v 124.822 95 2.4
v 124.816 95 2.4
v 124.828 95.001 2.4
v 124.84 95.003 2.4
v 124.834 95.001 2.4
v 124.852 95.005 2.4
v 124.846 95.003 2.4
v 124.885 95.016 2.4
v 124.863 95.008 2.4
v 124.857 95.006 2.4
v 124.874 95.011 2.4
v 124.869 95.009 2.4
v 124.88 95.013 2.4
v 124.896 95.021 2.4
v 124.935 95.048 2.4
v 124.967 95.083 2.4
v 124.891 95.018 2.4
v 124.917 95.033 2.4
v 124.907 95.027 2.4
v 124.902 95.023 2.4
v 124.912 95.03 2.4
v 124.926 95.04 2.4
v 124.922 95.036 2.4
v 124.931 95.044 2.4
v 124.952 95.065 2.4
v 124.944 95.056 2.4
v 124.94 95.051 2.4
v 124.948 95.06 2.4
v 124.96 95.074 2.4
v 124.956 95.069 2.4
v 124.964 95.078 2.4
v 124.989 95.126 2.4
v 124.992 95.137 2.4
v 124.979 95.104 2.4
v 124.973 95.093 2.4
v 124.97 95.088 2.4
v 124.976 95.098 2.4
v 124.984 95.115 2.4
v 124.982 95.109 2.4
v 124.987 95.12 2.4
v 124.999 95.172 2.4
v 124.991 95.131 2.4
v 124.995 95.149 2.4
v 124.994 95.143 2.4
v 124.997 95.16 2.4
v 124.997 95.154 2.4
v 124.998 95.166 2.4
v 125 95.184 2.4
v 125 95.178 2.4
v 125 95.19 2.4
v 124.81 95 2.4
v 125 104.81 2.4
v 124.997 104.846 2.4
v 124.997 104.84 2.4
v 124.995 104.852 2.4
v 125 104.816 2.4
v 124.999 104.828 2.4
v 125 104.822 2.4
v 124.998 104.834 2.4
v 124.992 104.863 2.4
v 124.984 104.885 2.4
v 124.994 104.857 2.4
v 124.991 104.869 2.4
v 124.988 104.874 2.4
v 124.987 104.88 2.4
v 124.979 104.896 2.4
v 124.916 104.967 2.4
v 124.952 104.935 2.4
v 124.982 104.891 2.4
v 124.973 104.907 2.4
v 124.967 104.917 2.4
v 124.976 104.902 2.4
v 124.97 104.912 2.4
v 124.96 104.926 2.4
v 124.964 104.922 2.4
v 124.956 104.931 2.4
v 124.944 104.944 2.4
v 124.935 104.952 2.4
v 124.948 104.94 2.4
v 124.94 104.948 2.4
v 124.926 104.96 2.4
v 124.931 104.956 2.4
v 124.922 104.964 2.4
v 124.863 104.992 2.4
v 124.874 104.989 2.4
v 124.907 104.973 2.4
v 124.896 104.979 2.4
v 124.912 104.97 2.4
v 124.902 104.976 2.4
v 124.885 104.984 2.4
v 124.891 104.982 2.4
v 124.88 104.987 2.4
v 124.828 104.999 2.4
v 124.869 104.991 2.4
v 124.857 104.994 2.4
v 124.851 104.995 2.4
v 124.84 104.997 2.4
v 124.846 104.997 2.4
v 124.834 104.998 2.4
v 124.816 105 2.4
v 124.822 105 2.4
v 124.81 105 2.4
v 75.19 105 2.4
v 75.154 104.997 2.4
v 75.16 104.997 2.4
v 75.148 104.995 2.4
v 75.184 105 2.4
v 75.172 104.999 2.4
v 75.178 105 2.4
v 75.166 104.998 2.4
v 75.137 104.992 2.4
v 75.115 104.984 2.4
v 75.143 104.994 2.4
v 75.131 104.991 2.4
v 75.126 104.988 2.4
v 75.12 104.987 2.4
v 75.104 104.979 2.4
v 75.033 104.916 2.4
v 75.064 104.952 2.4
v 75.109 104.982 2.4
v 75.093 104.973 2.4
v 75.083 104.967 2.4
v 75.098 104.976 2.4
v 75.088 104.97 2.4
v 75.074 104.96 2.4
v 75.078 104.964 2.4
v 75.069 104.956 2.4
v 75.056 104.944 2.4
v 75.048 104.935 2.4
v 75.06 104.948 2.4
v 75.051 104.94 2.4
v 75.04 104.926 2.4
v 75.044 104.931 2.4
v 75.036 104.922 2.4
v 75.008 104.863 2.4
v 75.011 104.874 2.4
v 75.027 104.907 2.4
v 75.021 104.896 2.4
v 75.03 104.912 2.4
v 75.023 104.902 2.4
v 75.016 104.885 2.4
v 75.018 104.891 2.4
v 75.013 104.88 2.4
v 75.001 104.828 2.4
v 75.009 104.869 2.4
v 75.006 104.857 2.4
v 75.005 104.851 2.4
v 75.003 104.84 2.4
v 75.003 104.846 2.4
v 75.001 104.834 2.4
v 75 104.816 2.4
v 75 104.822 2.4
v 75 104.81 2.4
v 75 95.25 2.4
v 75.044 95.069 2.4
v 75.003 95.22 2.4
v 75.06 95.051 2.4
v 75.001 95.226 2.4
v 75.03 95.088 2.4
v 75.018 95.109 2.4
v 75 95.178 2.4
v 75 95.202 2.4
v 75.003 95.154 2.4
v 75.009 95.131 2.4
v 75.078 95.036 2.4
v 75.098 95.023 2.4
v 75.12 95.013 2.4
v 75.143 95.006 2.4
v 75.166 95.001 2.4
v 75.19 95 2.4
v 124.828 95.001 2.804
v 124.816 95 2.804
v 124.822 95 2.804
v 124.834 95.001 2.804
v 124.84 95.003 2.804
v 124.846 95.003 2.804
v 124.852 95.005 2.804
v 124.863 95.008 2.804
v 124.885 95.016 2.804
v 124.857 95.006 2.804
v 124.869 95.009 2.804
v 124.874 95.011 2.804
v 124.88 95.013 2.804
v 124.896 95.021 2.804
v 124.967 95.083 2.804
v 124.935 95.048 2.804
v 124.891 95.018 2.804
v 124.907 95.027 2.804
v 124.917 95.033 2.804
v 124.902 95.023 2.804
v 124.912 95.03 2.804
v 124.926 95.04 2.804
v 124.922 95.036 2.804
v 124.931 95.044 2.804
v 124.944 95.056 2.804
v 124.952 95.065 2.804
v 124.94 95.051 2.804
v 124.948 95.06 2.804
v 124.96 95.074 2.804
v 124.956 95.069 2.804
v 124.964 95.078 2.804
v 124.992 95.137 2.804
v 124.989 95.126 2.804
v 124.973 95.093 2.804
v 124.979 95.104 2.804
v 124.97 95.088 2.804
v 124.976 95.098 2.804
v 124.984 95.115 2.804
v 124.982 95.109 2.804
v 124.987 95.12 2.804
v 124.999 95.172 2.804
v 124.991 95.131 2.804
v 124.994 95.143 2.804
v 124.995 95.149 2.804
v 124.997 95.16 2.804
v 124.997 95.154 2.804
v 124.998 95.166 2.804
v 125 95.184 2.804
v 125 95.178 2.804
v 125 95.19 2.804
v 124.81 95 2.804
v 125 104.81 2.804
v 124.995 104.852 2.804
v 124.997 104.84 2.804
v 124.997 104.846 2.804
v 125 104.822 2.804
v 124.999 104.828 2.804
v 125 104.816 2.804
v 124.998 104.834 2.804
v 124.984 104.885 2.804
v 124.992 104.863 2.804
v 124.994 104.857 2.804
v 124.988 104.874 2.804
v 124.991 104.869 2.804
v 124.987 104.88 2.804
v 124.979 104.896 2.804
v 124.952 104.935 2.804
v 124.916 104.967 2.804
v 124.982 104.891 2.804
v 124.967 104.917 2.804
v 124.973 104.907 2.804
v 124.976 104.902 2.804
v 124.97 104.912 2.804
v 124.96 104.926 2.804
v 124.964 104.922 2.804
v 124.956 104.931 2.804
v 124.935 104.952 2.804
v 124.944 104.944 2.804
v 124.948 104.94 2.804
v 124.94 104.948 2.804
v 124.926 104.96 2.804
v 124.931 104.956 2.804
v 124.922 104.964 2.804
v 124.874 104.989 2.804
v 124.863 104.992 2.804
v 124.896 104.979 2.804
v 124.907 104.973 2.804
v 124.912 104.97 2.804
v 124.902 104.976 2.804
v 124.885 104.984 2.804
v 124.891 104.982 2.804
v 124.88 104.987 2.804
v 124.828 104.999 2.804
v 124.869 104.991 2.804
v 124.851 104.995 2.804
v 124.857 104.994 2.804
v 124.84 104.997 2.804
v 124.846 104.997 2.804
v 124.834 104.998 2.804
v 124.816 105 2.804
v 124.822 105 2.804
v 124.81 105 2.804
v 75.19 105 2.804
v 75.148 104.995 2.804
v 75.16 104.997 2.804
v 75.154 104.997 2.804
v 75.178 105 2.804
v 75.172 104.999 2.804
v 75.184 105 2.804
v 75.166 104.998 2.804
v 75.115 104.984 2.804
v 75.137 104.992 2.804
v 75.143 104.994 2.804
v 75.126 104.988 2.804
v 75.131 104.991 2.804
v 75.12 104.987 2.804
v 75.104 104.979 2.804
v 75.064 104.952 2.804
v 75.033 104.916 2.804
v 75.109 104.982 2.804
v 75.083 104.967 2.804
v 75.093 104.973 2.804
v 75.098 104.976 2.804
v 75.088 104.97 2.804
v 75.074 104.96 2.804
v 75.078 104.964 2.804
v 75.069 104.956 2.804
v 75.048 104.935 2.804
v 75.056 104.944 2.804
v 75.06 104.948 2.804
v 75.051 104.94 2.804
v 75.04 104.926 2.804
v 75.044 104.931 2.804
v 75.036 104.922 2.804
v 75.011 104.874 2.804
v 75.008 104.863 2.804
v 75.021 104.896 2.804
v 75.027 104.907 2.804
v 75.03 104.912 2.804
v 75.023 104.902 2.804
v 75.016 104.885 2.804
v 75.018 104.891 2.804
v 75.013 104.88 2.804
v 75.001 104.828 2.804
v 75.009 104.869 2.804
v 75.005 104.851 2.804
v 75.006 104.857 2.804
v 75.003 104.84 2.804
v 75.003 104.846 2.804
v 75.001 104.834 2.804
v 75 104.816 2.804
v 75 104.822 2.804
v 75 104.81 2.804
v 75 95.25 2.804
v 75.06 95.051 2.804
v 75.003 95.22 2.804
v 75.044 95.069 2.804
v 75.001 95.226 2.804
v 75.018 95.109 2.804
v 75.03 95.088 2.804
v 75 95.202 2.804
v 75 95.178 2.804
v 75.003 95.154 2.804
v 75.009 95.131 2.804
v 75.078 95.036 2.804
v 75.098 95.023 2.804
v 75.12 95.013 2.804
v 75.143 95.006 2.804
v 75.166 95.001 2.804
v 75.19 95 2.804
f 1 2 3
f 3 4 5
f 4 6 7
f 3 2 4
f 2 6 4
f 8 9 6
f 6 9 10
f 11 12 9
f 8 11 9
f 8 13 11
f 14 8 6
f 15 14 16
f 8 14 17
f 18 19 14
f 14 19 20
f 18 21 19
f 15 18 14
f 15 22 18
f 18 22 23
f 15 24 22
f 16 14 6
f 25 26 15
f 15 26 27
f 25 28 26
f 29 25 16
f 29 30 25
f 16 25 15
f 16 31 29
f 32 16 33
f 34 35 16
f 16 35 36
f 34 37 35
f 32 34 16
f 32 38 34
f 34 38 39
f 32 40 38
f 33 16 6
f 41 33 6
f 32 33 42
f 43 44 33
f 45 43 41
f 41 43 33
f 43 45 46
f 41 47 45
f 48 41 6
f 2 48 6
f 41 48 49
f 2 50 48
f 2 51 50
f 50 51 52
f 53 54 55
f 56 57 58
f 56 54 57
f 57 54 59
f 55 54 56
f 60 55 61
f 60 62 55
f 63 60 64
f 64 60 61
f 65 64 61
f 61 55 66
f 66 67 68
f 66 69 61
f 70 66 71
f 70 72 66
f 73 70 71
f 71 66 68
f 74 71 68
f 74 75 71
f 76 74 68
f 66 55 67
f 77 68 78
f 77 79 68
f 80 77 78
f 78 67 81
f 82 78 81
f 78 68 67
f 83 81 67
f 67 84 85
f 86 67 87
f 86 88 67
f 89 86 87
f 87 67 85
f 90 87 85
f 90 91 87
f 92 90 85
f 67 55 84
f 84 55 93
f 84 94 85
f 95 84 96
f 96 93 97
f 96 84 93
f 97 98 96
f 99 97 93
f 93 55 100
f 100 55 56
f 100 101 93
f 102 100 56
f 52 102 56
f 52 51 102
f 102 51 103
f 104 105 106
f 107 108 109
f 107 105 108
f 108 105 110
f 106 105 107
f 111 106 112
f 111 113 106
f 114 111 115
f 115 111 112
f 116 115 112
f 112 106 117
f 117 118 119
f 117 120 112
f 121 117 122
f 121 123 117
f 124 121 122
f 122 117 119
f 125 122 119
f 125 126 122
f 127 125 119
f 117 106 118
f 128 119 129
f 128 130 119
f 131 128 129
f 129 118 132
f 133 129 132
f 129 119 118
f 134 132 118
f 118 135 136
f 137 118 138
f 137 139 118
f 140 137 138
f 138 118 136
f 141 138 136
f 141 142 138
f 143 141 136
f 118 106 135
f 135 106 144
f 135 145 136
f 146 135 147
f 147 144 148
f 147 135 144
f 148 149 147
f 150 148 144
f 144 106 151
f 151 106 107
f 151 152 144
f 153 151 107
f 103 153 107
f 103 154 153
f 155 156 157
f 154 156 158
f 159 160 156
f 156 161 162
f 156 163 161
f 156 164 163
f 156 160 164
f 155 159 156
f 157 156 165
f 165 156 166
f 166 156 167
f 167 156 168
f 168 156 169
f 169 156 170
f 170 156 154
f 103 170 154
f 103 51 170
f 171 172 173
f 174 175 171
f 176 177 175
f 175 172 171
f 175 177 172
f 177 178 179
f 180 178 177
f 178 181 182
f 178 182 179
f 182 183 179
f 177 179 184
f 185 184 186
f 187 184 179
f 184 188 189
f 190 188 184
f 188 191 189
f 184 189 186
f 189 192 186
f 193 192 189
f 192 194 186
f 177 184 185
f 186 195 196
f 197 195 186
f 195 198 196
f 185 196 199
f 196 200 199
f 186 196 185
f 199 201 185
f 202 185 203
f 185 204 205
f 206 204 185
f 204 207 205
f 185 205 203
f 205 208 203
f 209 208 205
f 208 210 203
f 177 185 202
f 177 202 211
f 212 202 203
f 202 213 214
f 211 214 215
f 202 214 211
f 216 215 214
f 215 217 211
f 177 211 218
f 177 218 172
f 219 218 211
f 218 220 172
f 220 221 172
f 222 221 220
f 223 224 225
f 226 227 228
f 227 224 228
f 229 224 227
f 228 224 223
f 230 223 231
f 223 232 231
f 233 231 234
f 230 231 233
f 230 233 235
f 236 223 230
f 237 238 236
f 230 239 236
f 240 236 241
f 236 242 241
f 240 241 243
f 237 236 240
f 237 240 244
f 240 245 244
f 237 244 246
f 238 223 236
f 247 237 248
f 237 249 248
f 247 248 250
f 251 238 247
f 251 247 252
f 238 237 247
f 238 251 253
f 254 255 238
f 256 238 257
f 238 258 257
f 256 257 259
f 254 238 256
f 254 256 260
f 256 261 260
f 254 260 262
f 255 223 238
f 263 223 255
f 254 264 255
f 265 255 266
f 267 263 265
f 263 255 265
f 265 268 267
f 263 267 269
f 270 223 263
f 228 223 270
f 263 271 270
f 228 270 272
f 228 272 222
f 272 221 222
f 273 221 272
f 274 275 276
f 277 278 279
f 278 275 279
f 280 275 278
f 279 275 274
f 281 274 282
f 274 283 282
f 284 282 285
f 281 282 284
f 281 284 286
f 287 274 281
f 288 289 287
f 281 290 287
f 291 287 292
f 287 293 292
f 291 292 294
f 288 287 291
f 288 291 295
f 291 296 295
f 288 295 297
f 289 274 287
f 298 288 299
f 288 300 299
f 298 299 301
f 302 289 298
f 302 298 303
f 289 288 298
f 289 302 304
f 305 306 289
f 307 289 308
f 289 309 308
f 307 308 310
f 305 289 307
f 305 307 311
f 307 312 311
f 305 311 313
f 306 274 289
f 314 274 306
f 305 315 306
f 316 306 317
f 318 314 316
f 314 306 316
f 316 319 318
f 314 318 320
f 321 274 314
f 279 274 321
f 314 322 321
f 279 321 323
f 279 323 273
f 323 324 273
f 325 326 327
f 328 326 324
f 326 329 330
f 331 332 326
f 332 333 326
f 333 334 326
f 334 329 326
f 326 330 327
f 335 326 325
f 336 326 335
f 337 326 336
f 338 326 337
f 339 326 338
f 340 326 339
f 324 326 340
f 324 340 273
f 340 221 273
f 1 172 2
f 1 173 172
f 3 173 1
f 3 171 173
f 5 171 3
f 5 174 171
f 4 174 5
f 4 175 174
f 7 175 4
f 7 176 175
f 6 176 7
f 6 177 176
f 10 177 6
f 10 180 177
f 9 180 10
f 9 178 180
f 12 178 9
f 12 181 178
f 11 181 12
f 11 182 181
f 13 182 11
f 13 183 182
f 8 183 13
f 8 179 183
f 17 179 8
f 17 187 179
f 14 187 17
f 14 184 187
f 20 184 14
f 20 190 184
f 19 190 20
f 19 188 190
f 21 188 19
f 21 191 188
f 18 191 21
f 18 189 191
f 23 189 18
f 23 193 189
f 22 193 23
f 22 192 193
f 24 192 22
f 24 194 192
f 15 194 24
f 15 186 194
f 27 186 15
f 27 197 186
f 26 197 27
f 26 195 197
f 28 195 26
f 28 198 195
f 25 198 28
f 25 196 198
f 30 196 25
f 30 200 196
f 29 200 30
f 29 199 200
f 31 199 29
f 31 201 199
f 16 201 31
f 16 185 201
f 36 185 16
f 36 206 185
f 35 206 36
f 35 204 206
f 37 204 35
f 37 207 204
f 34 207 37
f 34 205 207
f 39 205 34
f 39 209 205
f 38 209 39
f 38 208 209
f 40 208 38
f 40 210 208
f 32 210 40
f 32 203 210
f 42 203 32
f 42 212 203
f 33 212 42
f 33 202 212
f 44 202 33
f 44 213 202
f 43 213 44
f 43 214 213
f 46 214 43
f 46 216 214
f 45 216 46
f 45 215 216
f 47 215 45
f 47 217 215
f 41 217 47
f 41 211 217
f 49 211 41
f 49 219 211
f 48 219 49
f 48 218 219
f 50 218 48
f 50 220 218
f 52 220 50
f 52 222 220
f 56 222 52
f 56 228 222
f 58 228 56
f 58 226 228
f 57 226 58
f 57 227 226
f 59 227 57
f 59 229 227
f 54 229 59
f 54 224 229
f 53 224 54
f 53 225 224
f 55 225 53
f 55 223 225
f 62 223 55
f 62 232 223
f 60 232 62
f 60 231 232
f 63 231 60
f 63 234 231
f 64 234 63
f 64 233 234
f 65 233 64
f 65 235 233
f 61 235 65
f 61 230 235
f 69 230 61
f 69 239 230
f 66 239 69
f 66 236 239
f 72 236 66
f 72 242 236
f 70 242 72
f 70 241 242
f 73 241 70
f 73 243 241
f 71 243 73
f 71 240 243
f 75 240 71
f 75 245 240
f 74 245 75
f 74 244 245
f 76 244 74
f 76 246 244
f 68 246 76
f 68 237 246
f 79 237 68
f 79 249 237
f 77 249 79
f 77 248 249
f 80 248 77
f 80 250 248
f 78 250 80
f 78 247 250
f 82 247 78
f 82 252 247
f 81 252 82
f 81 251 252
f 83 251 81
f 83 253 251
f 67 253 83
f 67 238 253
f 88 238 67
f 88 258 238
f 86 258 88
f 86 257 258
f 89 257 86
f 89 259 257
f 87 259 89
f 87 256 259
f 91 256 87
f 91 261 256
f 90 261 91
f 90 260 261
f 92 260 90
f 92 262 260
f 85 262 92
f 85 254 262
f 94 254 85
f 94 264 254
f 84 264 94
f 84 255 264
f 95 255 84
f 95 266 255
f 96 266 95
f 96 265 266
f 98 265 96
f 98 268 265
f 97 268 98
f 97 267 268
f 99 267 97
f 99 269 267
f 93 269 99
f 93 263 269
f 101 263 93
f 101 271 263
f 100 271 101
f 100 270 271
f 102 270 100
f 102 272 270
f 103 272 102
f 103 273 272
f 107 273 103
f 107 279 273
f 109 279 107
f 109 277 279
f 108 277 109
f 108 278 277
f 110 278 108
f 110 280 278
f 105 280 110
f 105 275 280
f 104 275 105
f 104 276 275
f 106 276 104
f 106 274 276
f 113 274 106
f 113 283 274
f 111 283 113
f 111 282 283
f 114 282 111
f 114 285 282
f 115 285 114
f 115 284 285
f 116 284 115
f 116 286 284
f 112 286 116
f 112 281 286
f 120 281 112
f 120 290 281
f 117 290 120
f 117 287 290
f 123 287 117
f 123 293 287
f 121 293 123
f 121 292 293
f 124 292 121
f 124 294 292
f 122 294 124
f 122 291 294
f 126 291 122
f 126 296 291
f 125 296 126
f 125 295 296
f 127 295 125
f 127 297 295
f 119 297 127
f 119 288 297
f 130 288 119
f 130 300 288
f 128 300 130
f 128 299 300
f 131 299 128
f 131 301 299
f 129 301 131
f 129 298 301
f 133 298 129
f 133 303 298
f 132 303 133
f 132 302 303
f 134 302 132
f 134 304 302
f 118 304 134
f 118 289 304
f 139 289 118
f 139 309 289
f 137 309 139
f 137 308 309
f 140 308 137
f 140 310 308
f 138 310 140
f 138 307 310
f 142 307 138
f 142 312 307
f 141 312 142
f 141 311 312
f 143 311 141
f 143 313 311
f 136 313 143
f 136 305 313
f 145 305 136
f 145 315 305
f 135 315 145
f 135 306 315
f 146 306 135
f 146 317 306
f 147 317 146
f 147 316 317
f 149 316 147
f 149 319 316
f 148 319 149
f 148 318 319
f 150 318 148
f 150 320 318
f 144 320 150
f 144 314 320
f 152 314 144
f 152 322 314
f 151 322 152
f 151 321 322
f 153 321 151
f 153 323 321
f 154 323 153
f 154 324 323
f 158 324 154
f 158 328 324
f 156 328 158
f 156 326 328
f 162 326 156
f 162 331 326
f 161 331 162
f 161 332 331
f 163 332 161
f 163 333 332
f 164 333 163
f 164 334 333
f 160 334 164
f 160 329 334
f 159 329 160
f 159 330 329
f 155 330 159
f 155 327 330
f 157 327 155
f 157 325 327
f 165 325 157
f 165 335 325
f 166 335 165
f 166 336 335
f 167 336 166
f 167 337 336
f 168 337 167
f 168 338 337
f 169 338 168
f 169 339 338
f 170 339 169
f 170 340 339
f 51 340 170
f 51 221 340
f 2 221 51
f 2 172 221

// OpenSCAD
module drawBasicShape(x1, y1, x2, y2, width)
{
	length = sqrt((x1-x2)*(x1-x2) + (y1-y2)*(y1-y2));
	if (width!=0.0) {
		square(size = [width, length], center = false);
		translate([width/2.0, 0, 0]) circle(d=width);
		translate([width/2.0, length, 0]) circle(d=width);
	}
}

module translateAndRotate(x1, y1, x2, y2, width)
{
	if (width != 0.0) {
		angle = atan((y2-y1)/(x2-x1)) +270;
		if (x2>=x1) {
			translate([x1, y1, 0.0]) rotate([0.0, 0.0, angle]) translate([-width/2.0, 0.0, 0.0]) scale([1.0, 1.0, 1.0]) drawBasicShape(x1, y1, x2, y2, width);
		}
		else {
			translate([x1, y1, 0.0]) rotate([0.0, 0.0, angle+180]) translate([-width/2.0, 0.0, 0.0]) scale([1.0, 1.0, 1.0]) drawBasicShape(x1, y1, x2, y2, width);		}
	}
}

$fn=50;

points5 = [
[75.77800000, 95.77800000, 0.00000000],
[124.22200000, 95.77800000, 0.37999548],
[124.22200000, 104.22200000, 0.37997788],
[75.77800000, 104.22200000, 0.37999672],
[75.77800000, 95.83800000, 0.37997423],
[75.48400000, 95.48400000, 0.00000000],
[124.51600000, 95.48400000, 0.37999868],
[124.51600000, 104.51600000, 0.37998977],
[75.48400000, 104.51600000, 0.37999746],
[75.48400000, 95.54400000, 0.37999314],
[75.19000000, 95.19000000, 0.00000000],
[124.81000000, 95.19000000, 0.37999939],
[124.81000000, 104.81000000, 0.38000021],
[75.19000000, 104.81000000, 0.38000060],
[75.19000000, 95.25000000, 0.37999715],
[75.53600000, 95.39000000, 0.00000000],
[76.11100000, 95.94600000, 0.00000000],
[75.94600000, 96.11100000, 0.37961375],
[75.94600000, 96.52800000, 0.38001190],
[76.52800000, 95.94600000, 0.37989934],
[76.94500000, 95.94600000, 0.38015610],
[75.94600000, 96.94500000, 0.37994651],
[75.94600000, 97.36200000, 0.38001190],
[77.36200000, 95.94600000, 0.37999592],
[77.77900000, 95.94600000, 0.38001190],
[75.94600000, 97.77900000, 0.37999966],
[75.94600000, 98.19600000, 0.38015610],
[78.19600000, 95.94600000, 0.38000201],
[78.61300000, 95.94600000, 0.38001190],
[75.94600000, 98.61300000, 0.38001957],
[75.94600000, 99.03000000, 0.38001190],
[79.03000000, 95.94600000, 0.38001859],
[79.44700000, 95.94600000, 0.38015610],
[75.94600000, 99.44700000, 0.38001785],
[75.94600000, 99.86400000, 0.38001190],
[79.86400000, 95.94600000, 0.38002811],
[80.28100000, 95.94600000, 0.38001190],
[75.94600000, 100.28100000, 0.38002660],
[75.94600000, 100.69800000, 0.38001190],
[80.69800000, 95.94600000, 0.38003429],
[81.11500000, 95.94600000, 0.38001190],
[75.94600000, 101.11500000, 0.38003252],
[75.94600000, 101.53300000, 0.37930814],
[81.53300000, 95.94600000, 0.37997836],
[81.95000000, 95.94600000, 0.38001190],
[75.94600000, 101.95000000, 0.37998072],
[75.94600000, 102.36700000, 0.38015610],
[82.36700000, 95.94600000, 0.37998277],
[82.78400000, 95.94600000, 0.38015610],
[75.94600000, 102.78400000, 0.37999079],
[75.94600000, 103.20100000, 0.38001190],
[83.20100000, 95.94600000, 0.37999203],
[83.61800000, 95.94600000, 0.38001190],
[75.94600000, 103.61800000, 0.37999868],
[75.95600000, 104.02400000, 0.38048727],
[84.03500000, 95.94600000, 0.38000275],
[84.45200000, 95.94600000, 0.38001190],
[76.34400000, 104.05400000, 0.38000229],
[76.76100000, 104.05400000, 0.38015610],
[84.86900000, 95.94600000, 0.38000229],
[85.28600000, 95.94600000, 0.38001190],
[77.17800000, 104.05400000, 0.38000754],
[77.59500000, 104.05400000, 0.38001190],
[85.70300000, 95.94600000, 0.38000229],
[86.12000000, 95.94600000, 0.38001190],
[78.01200000, 104.05400000, 0.38000754],
[78.42900000, 104.05400000, 0.38001190],
[86.53700000, 95.94600000, 0.38000229],
[86.95400000, 95.94600000, 0.38015610],
[78.84600000, 104.05400000, 0.38000229],
[79.26300000, 104.05400000, 0.38001190],
[87.37100000, 95.94600000, 0.38000229],
[87.78900000, 95.94600000, 0.37945200],
[79.68000000, 104.05400000, 0.37998415],
[80.09700000, 104.05400000, 0.38001190],
[88.20600000, 95.94600000, 0.37998940],
[88.62300000, 95.94600000, 0.38001190],
[80.51500000, 104.05400000, 0.38000229],
[80.93200000, 104.05400000, 0.38015610],
[89.04000000, 95.94600000, 0.38000229],
[89.45700000, 95.94600000, 0.38001190],
[81.34900000, 104.05400000, 0.38000229],
[81.76600000, 104.05400000, 0.38015610],
[89.87400000, 95.94600000, 0.38000229],
[90.29100000, 95.94600000, 0.38001190],
[82.18300000, 104.05400000, 0.38000754],
[82.60000000, 104.05400000, 0.38001190],
[90.70800000, 95.94600000, 0.38000229],
[91.12500000, 95.94600000, 0.38001190],
[83.01700000, 104.05400000, 0.38000754],
[83.43400000, 104.05400000, 0.38001190],
[91.54200000, 95.94600000, 0.38000229],
[91.95900000, 95.94600000, 0.38015610],
[83.85100000, 104.05400000, 0.38000229],
[84.26800000, 104.05400000, 0.38001190],
[92.37600000, 95.94600000, 0.38000754],
[92.79300000, 95.94600000, 0.38001190],
[84.68500000, 104.05400000, 0.38000229],
[85.10200000, 104.05400000, 0.38001190],
[93.21000000, 95.94600000, 0.38000754],
[93.62700000, 95.94600000, 0.38001190],
[85.51900000, 104.05400000, 0.38000229],
[85.93600000, 104.05400000, 0.38015610],
[94.04400000, 95.94600000, 0.38000229],
[94.46200000, 95.94600000, 0.37930814],
[86.35300000, 104.05400000, 0.37998940],
[86.77000000, 104.05400000, 0.38001190],
[94.87900000, 95.94600000, 0.37998415],
[95.29600000, 95.94600000, 0.38001190],
[87.18800000, 104.05400000, 0.38000754],
[87.60500000, 104.05400000, 0.38001190],
[95.71300000, 95.94600000, 0.38000229],
[96.13000000, 95.94600000, 0.38015610],
[88.02200000, 104.05400000, 0.38000229],
[88.43900000, 104.05400000, 0.38001190],
[96.54700000, 95.94600000, 0.38000754],
[96.96400000, 95.94600000, 0.38001190],
[88.85600000, 104.05400000, 0.38000229],
[89.27300000, 104.05400000, 0.38001190],
[97.38100000, 95.94600000, 0.38000754],
[97.79800000, 95.94600000, 0.38001190],
[89.69000000, 104.05400000, 0.38000229],
[90.10700000, 104.05400000, 0.38015610],
[98.21500000, 95.94600000, 0.38000229],
[98.63200000, 95.94600000, 0.38001190],
[90.52400000, 104.05400000, 0.38000754],
[90.94100000, 104.05400000, 0.38001190],
[99.04900000, 95.94600000, 0.38000229],
[99.46600000, 95.94600000, 0.38001190],
[91.35800000, 104.05400000, 0.38000754],
[91.77500000, 104.05400000, 0.38001190],
[99.88300000, 95.94600000, 0.38000229],
[100.30000000, 95.94600000, 0.38015610],
[92.19200000, 104.05400000, 0.38000229],
[92.60900000, 104.05400000, 0.38001190],
[100.71800000, 95.94600000, 0.37998940],
[101.13500000, 95.94600000, 0.38001190],
[93.02600000, 104.05400000, 0.37998415],
[93.44400000, 104.05400000, 0.37930814],
[101.55200000, 95.94600000, 0.38000754],
[101.96900000, 95.94600000, 0.38001190],
[93.86100000, 104.05400000, 0.38000229],
[94.27800000, 104.05400000, 0.38015610],
[102.38600000, 95.94600000, 0.38000229],
[102.80300000, 95.94600000, 0.38001190],
[94.69500000, 104.05400000, 0.38000754],
[95.11200000, 104.05400000, 0.38001190],
[103.22000000, 95.94600000, 0.38000229],
[103.63700000, 95.94600000, 0.38001190],
[95.52900000, 104.05400000, 0.38000754],
[95.94600000, 104.05400000, 0.38001190],
[104.05400000, 95.94600000, 0.38000229],
[104.47100000, 95.94600000, 0.38015610],
[96.36300000, 104.05400000, 0.38000229],
[96.78000000, 104.05400000, 0.38001190],
[104.88800000, 95.94600000, 0.38000754],
[105.30500000, 95.94600000, 0.38001190],
[97.19700000, 104.05400000, 0.38000229],
[97.61400000, 104.05400000, 0.38001190],
[105.72200000, 95.94600000, 0.38000754],
[106.13900000, 95.94600000, 0.38001190],
[98.03100000, 104.05400000, 0.38000229],
[98.44800000, 104.05400000, 0.38015610],
[106.55600000, 95.94600000, 0.38000229],
[106.97300000, 95.94600000, 0.38001190],
[98.86500000, 104.05400000, 0.38000754],
[99.28200000, 104.05400000, 0.38001190],
[107.39100000, 95.94600000, 0.37998415],
[107.80800000, 95.94600000, 0.38001190],
[99.69900000, 104.05400000, 0.37998940],
[100.11700000, 104.05400000, 0.37930814],
[108.22500000, 95.94600000, 0.38000229],
[108.64200000, 95.94600000, 0.38015610],
[100.53400000, 104.05400000, 0.38000229],
[100.95100000, 104.05400000, 0.38001190],
[109.05900000, 95.94600000, 0.38000754],
[109.47600000, 95.94600000, 0.38001190],
[101.36800000, 104.05400000, 0.38000229],
[101.78500000, 104.05400000, 0.38001190],
[109.89300000, 95.94600000, 0.38000754],
[110.31000000, 95.94600000, 0.38001190],
[102.20200000, 104.05400000, 0.38000229],
[102.61900000, 104.05400000, 0.38015610],
[110.72700000, 95.94600000, 0.38000229],
[111.14400000, 95.94600000, 0.38001190],
[103.03600000, 104.05400000, 0.38000754],
[103.45300000, 104.05400000, 0.38001190],
[111.56100000, 95.94600000, 0.38000229],
[111.97800000, 95.94600000, 0.38001190],
[103.87000000, 104.05400000, 0.38000754],
[104.28700000, 104.05400000, 0.38001190],
[112.39500000, 95.94600000, 0.38000229],
[112.81200000, 95.94600000, 0.38015610],
[104.70400000, 104.05400000, 0.38000229],
[105.12100000, 104.05400000, 0.38001190],
[113.22900000, 95.94600000, 0.38000754],
[113.64700000, 95.94600000, 0.37930814],
[105.53800000, 104.05400000, 0.37998415],
[105.95500000, 104.05400000, 0.38001190],
[114.06400000, 95.94600000, 0.37998940],
[114.48100000, 95.94600000, 0.38001190],
[106.37300000, 104.05400000, 0.38000229],
[106.79000000, 104.05400000, 0.38015610],
[114.89800000, 95.94600000, 0.38000229],
[115.31500000, 95.94600000, 0.38001190],
[107.20700000, 104.05400000, 0.38000754],
[107.62400000, 104.05400000, 0.38001190],
[115.73200000, 95.94600000, 0.38000229],
[116.14900000, 95.94600000, 0.38001190],
[108.04100000, 104.05400000, 0.38000754],
[108.45800000, 104.05400000, 0.38001190],
[116.56600000, 95.94600000, 0.38000229],
[116.98300000, 95.94600000, 0.38015610],
[108.87500000, 104.05400000, 0.38000229],
[109.29200000, 104.05400000, 0.38001190],
[117.40000000, 95.94600000, 0.38000754],
[117.81700000, 95.94600000, 0.38001190],
[109.70900000, 104.05400000, 0.38000229],
[110.12600000, 104.05400000, 0.38001190],
[118.23400000, 95.94600000, 0.38000754],
[118.65100000, 95.94600000, 0.38001190],
[110.54300000, 104.05400000, 0.38000229],
[110.96000000, 104.05400000, 0.38015610],
[119.06800000, 95.94600000, 0.38000229],
[119.48500000, 95.94600000, 0.38001190],
[111.37700000, 104.05400000, 0.38000229],
[111.79400000, 104.05400000, 0.38015610],
[119.90200000, 95.94600000, 0.38000229],
[120.32000000, 95.94600000, 0.37930814],
[112.21100000, 104.05400000, 0.37998940],
[112.62900000, 104.05400000, 0.37930814],
[120.73700000, 95.94600000, 0.38000229],
[121.15400000, 95.94600000, 0.38015610],
[113.04600000, 104.05400000, 0.38000229],
[113.46300000, 104.05400000, 0.38001190],
[121.57100000, 95.94600000, 0.38000229],
[121.98800000, 95.94600000, 0.38015610],
[113.88000000, 104.05400000, 0.38000229],
[114.29700000, 104.05400000, 0.38001190],
[122.40500000, 95.94600000, 0.38000754],
[122.82200000, 95.94600000, 0.38001190],
[114.71400000, 104.05400000, 0.38000229],
[115.13100000, 104.05400000, 0.38015610],
[123.23900000, 95.94600000, 0.38000229],
[123.65600000, 95.94600000, 0.38001190],
[115.54800000, 104.05400000, 0.38000229],
[115.96500000, 104.05400000, 0.38015610],
[124.04400000, 95.97500000, 0.37998455],
[124.05400000, 96.38200000, 0.37961606],
[116.38200000, 104.05400000, 0.37999868],
[116.79900000, 104.05400000, 0.38015610],
[124.05400000, 96.79900000, 0.37999203],
[124.05400000, 97.21600000, 0.38015610],
[117.21600000, 104.05400000, 0.37999079],
[117.63300000, 104.05400000, 0.38001190],
[124.05400000, 97.63300000, 0.37998939],
[124.05400000, 98.05000000, 0.38001190],
[118.05000000, 104.05400000, 0.37998780],
[118.46700000, 104.05400000, 0.38001190],
[124.05400000, 98.46700000, 0.37998597],
[124.05400000, 98.88400000, 0.38001190],
[118.88400000, 104.05400000, 0.37997562],
[119.30200000, 104.05400000, 0.37930814],
[124.05400000, 99.30200000, 0.38003429],
[124.05400000, 99.71900000, 0.38001190],
[119.71900000, 104.05400000, 0.38003640],
[120.13600000, 104.05400000, 0.38001190],
[124.05400000, 100.13600000, 0.38002811],
[124.05400000, 100.55300000, 0.38001190],
[120.55300000, 104.05400000, 0.38002999],
[120.97000000, 104.05400000, 0.38001190],
[124.05400000, 100.97000000, 0.38003238],
[124.05400000, 101.38700000, 0.38001190],
[121.38700000, 104.05400000, 0.38001957],
[121.80400000, 104.05400000, 0.38001190],
[124.05400000, 101.80400000, 0.38002091],
[124.05400000, 102.22100000, 0.38001190],
[122.22100000, 104.05400000, 0.38002285],
[122.63800000, 104.05400000, 0.38001190],
[124.05400000, 102.63800000, 0.37999592],
[124.05400000, 103.05500000, 0.38001190],
[123.05500000, 104.05400000, 0.37998907],
[123.47200000, 104.05400000, 0.38001190],
[124.05400000, 103.47200000, 0.37997240],
[124.05400000, 103.88900000, 0.38001190],
[123.88900000, 104.05400000, 0.37961375],
];

translate([0.0, 0.0, 2.40000000]) {
	linear_extrude(height = 0.40400000, center = false, convexity = 10, twist = 0) {
		union() {
			for( i=[0:len(points5)-2] ){ 
				x1 = points5[i][0];
				y1 = points5[i][1];
				x2 = points5[i+1][0];
				y2 = points5[i+1][1];
				width = points5[i+1][2];
				translateAndRotate(x1, y1, x2, y2, width);
			}
		}
	}
}
